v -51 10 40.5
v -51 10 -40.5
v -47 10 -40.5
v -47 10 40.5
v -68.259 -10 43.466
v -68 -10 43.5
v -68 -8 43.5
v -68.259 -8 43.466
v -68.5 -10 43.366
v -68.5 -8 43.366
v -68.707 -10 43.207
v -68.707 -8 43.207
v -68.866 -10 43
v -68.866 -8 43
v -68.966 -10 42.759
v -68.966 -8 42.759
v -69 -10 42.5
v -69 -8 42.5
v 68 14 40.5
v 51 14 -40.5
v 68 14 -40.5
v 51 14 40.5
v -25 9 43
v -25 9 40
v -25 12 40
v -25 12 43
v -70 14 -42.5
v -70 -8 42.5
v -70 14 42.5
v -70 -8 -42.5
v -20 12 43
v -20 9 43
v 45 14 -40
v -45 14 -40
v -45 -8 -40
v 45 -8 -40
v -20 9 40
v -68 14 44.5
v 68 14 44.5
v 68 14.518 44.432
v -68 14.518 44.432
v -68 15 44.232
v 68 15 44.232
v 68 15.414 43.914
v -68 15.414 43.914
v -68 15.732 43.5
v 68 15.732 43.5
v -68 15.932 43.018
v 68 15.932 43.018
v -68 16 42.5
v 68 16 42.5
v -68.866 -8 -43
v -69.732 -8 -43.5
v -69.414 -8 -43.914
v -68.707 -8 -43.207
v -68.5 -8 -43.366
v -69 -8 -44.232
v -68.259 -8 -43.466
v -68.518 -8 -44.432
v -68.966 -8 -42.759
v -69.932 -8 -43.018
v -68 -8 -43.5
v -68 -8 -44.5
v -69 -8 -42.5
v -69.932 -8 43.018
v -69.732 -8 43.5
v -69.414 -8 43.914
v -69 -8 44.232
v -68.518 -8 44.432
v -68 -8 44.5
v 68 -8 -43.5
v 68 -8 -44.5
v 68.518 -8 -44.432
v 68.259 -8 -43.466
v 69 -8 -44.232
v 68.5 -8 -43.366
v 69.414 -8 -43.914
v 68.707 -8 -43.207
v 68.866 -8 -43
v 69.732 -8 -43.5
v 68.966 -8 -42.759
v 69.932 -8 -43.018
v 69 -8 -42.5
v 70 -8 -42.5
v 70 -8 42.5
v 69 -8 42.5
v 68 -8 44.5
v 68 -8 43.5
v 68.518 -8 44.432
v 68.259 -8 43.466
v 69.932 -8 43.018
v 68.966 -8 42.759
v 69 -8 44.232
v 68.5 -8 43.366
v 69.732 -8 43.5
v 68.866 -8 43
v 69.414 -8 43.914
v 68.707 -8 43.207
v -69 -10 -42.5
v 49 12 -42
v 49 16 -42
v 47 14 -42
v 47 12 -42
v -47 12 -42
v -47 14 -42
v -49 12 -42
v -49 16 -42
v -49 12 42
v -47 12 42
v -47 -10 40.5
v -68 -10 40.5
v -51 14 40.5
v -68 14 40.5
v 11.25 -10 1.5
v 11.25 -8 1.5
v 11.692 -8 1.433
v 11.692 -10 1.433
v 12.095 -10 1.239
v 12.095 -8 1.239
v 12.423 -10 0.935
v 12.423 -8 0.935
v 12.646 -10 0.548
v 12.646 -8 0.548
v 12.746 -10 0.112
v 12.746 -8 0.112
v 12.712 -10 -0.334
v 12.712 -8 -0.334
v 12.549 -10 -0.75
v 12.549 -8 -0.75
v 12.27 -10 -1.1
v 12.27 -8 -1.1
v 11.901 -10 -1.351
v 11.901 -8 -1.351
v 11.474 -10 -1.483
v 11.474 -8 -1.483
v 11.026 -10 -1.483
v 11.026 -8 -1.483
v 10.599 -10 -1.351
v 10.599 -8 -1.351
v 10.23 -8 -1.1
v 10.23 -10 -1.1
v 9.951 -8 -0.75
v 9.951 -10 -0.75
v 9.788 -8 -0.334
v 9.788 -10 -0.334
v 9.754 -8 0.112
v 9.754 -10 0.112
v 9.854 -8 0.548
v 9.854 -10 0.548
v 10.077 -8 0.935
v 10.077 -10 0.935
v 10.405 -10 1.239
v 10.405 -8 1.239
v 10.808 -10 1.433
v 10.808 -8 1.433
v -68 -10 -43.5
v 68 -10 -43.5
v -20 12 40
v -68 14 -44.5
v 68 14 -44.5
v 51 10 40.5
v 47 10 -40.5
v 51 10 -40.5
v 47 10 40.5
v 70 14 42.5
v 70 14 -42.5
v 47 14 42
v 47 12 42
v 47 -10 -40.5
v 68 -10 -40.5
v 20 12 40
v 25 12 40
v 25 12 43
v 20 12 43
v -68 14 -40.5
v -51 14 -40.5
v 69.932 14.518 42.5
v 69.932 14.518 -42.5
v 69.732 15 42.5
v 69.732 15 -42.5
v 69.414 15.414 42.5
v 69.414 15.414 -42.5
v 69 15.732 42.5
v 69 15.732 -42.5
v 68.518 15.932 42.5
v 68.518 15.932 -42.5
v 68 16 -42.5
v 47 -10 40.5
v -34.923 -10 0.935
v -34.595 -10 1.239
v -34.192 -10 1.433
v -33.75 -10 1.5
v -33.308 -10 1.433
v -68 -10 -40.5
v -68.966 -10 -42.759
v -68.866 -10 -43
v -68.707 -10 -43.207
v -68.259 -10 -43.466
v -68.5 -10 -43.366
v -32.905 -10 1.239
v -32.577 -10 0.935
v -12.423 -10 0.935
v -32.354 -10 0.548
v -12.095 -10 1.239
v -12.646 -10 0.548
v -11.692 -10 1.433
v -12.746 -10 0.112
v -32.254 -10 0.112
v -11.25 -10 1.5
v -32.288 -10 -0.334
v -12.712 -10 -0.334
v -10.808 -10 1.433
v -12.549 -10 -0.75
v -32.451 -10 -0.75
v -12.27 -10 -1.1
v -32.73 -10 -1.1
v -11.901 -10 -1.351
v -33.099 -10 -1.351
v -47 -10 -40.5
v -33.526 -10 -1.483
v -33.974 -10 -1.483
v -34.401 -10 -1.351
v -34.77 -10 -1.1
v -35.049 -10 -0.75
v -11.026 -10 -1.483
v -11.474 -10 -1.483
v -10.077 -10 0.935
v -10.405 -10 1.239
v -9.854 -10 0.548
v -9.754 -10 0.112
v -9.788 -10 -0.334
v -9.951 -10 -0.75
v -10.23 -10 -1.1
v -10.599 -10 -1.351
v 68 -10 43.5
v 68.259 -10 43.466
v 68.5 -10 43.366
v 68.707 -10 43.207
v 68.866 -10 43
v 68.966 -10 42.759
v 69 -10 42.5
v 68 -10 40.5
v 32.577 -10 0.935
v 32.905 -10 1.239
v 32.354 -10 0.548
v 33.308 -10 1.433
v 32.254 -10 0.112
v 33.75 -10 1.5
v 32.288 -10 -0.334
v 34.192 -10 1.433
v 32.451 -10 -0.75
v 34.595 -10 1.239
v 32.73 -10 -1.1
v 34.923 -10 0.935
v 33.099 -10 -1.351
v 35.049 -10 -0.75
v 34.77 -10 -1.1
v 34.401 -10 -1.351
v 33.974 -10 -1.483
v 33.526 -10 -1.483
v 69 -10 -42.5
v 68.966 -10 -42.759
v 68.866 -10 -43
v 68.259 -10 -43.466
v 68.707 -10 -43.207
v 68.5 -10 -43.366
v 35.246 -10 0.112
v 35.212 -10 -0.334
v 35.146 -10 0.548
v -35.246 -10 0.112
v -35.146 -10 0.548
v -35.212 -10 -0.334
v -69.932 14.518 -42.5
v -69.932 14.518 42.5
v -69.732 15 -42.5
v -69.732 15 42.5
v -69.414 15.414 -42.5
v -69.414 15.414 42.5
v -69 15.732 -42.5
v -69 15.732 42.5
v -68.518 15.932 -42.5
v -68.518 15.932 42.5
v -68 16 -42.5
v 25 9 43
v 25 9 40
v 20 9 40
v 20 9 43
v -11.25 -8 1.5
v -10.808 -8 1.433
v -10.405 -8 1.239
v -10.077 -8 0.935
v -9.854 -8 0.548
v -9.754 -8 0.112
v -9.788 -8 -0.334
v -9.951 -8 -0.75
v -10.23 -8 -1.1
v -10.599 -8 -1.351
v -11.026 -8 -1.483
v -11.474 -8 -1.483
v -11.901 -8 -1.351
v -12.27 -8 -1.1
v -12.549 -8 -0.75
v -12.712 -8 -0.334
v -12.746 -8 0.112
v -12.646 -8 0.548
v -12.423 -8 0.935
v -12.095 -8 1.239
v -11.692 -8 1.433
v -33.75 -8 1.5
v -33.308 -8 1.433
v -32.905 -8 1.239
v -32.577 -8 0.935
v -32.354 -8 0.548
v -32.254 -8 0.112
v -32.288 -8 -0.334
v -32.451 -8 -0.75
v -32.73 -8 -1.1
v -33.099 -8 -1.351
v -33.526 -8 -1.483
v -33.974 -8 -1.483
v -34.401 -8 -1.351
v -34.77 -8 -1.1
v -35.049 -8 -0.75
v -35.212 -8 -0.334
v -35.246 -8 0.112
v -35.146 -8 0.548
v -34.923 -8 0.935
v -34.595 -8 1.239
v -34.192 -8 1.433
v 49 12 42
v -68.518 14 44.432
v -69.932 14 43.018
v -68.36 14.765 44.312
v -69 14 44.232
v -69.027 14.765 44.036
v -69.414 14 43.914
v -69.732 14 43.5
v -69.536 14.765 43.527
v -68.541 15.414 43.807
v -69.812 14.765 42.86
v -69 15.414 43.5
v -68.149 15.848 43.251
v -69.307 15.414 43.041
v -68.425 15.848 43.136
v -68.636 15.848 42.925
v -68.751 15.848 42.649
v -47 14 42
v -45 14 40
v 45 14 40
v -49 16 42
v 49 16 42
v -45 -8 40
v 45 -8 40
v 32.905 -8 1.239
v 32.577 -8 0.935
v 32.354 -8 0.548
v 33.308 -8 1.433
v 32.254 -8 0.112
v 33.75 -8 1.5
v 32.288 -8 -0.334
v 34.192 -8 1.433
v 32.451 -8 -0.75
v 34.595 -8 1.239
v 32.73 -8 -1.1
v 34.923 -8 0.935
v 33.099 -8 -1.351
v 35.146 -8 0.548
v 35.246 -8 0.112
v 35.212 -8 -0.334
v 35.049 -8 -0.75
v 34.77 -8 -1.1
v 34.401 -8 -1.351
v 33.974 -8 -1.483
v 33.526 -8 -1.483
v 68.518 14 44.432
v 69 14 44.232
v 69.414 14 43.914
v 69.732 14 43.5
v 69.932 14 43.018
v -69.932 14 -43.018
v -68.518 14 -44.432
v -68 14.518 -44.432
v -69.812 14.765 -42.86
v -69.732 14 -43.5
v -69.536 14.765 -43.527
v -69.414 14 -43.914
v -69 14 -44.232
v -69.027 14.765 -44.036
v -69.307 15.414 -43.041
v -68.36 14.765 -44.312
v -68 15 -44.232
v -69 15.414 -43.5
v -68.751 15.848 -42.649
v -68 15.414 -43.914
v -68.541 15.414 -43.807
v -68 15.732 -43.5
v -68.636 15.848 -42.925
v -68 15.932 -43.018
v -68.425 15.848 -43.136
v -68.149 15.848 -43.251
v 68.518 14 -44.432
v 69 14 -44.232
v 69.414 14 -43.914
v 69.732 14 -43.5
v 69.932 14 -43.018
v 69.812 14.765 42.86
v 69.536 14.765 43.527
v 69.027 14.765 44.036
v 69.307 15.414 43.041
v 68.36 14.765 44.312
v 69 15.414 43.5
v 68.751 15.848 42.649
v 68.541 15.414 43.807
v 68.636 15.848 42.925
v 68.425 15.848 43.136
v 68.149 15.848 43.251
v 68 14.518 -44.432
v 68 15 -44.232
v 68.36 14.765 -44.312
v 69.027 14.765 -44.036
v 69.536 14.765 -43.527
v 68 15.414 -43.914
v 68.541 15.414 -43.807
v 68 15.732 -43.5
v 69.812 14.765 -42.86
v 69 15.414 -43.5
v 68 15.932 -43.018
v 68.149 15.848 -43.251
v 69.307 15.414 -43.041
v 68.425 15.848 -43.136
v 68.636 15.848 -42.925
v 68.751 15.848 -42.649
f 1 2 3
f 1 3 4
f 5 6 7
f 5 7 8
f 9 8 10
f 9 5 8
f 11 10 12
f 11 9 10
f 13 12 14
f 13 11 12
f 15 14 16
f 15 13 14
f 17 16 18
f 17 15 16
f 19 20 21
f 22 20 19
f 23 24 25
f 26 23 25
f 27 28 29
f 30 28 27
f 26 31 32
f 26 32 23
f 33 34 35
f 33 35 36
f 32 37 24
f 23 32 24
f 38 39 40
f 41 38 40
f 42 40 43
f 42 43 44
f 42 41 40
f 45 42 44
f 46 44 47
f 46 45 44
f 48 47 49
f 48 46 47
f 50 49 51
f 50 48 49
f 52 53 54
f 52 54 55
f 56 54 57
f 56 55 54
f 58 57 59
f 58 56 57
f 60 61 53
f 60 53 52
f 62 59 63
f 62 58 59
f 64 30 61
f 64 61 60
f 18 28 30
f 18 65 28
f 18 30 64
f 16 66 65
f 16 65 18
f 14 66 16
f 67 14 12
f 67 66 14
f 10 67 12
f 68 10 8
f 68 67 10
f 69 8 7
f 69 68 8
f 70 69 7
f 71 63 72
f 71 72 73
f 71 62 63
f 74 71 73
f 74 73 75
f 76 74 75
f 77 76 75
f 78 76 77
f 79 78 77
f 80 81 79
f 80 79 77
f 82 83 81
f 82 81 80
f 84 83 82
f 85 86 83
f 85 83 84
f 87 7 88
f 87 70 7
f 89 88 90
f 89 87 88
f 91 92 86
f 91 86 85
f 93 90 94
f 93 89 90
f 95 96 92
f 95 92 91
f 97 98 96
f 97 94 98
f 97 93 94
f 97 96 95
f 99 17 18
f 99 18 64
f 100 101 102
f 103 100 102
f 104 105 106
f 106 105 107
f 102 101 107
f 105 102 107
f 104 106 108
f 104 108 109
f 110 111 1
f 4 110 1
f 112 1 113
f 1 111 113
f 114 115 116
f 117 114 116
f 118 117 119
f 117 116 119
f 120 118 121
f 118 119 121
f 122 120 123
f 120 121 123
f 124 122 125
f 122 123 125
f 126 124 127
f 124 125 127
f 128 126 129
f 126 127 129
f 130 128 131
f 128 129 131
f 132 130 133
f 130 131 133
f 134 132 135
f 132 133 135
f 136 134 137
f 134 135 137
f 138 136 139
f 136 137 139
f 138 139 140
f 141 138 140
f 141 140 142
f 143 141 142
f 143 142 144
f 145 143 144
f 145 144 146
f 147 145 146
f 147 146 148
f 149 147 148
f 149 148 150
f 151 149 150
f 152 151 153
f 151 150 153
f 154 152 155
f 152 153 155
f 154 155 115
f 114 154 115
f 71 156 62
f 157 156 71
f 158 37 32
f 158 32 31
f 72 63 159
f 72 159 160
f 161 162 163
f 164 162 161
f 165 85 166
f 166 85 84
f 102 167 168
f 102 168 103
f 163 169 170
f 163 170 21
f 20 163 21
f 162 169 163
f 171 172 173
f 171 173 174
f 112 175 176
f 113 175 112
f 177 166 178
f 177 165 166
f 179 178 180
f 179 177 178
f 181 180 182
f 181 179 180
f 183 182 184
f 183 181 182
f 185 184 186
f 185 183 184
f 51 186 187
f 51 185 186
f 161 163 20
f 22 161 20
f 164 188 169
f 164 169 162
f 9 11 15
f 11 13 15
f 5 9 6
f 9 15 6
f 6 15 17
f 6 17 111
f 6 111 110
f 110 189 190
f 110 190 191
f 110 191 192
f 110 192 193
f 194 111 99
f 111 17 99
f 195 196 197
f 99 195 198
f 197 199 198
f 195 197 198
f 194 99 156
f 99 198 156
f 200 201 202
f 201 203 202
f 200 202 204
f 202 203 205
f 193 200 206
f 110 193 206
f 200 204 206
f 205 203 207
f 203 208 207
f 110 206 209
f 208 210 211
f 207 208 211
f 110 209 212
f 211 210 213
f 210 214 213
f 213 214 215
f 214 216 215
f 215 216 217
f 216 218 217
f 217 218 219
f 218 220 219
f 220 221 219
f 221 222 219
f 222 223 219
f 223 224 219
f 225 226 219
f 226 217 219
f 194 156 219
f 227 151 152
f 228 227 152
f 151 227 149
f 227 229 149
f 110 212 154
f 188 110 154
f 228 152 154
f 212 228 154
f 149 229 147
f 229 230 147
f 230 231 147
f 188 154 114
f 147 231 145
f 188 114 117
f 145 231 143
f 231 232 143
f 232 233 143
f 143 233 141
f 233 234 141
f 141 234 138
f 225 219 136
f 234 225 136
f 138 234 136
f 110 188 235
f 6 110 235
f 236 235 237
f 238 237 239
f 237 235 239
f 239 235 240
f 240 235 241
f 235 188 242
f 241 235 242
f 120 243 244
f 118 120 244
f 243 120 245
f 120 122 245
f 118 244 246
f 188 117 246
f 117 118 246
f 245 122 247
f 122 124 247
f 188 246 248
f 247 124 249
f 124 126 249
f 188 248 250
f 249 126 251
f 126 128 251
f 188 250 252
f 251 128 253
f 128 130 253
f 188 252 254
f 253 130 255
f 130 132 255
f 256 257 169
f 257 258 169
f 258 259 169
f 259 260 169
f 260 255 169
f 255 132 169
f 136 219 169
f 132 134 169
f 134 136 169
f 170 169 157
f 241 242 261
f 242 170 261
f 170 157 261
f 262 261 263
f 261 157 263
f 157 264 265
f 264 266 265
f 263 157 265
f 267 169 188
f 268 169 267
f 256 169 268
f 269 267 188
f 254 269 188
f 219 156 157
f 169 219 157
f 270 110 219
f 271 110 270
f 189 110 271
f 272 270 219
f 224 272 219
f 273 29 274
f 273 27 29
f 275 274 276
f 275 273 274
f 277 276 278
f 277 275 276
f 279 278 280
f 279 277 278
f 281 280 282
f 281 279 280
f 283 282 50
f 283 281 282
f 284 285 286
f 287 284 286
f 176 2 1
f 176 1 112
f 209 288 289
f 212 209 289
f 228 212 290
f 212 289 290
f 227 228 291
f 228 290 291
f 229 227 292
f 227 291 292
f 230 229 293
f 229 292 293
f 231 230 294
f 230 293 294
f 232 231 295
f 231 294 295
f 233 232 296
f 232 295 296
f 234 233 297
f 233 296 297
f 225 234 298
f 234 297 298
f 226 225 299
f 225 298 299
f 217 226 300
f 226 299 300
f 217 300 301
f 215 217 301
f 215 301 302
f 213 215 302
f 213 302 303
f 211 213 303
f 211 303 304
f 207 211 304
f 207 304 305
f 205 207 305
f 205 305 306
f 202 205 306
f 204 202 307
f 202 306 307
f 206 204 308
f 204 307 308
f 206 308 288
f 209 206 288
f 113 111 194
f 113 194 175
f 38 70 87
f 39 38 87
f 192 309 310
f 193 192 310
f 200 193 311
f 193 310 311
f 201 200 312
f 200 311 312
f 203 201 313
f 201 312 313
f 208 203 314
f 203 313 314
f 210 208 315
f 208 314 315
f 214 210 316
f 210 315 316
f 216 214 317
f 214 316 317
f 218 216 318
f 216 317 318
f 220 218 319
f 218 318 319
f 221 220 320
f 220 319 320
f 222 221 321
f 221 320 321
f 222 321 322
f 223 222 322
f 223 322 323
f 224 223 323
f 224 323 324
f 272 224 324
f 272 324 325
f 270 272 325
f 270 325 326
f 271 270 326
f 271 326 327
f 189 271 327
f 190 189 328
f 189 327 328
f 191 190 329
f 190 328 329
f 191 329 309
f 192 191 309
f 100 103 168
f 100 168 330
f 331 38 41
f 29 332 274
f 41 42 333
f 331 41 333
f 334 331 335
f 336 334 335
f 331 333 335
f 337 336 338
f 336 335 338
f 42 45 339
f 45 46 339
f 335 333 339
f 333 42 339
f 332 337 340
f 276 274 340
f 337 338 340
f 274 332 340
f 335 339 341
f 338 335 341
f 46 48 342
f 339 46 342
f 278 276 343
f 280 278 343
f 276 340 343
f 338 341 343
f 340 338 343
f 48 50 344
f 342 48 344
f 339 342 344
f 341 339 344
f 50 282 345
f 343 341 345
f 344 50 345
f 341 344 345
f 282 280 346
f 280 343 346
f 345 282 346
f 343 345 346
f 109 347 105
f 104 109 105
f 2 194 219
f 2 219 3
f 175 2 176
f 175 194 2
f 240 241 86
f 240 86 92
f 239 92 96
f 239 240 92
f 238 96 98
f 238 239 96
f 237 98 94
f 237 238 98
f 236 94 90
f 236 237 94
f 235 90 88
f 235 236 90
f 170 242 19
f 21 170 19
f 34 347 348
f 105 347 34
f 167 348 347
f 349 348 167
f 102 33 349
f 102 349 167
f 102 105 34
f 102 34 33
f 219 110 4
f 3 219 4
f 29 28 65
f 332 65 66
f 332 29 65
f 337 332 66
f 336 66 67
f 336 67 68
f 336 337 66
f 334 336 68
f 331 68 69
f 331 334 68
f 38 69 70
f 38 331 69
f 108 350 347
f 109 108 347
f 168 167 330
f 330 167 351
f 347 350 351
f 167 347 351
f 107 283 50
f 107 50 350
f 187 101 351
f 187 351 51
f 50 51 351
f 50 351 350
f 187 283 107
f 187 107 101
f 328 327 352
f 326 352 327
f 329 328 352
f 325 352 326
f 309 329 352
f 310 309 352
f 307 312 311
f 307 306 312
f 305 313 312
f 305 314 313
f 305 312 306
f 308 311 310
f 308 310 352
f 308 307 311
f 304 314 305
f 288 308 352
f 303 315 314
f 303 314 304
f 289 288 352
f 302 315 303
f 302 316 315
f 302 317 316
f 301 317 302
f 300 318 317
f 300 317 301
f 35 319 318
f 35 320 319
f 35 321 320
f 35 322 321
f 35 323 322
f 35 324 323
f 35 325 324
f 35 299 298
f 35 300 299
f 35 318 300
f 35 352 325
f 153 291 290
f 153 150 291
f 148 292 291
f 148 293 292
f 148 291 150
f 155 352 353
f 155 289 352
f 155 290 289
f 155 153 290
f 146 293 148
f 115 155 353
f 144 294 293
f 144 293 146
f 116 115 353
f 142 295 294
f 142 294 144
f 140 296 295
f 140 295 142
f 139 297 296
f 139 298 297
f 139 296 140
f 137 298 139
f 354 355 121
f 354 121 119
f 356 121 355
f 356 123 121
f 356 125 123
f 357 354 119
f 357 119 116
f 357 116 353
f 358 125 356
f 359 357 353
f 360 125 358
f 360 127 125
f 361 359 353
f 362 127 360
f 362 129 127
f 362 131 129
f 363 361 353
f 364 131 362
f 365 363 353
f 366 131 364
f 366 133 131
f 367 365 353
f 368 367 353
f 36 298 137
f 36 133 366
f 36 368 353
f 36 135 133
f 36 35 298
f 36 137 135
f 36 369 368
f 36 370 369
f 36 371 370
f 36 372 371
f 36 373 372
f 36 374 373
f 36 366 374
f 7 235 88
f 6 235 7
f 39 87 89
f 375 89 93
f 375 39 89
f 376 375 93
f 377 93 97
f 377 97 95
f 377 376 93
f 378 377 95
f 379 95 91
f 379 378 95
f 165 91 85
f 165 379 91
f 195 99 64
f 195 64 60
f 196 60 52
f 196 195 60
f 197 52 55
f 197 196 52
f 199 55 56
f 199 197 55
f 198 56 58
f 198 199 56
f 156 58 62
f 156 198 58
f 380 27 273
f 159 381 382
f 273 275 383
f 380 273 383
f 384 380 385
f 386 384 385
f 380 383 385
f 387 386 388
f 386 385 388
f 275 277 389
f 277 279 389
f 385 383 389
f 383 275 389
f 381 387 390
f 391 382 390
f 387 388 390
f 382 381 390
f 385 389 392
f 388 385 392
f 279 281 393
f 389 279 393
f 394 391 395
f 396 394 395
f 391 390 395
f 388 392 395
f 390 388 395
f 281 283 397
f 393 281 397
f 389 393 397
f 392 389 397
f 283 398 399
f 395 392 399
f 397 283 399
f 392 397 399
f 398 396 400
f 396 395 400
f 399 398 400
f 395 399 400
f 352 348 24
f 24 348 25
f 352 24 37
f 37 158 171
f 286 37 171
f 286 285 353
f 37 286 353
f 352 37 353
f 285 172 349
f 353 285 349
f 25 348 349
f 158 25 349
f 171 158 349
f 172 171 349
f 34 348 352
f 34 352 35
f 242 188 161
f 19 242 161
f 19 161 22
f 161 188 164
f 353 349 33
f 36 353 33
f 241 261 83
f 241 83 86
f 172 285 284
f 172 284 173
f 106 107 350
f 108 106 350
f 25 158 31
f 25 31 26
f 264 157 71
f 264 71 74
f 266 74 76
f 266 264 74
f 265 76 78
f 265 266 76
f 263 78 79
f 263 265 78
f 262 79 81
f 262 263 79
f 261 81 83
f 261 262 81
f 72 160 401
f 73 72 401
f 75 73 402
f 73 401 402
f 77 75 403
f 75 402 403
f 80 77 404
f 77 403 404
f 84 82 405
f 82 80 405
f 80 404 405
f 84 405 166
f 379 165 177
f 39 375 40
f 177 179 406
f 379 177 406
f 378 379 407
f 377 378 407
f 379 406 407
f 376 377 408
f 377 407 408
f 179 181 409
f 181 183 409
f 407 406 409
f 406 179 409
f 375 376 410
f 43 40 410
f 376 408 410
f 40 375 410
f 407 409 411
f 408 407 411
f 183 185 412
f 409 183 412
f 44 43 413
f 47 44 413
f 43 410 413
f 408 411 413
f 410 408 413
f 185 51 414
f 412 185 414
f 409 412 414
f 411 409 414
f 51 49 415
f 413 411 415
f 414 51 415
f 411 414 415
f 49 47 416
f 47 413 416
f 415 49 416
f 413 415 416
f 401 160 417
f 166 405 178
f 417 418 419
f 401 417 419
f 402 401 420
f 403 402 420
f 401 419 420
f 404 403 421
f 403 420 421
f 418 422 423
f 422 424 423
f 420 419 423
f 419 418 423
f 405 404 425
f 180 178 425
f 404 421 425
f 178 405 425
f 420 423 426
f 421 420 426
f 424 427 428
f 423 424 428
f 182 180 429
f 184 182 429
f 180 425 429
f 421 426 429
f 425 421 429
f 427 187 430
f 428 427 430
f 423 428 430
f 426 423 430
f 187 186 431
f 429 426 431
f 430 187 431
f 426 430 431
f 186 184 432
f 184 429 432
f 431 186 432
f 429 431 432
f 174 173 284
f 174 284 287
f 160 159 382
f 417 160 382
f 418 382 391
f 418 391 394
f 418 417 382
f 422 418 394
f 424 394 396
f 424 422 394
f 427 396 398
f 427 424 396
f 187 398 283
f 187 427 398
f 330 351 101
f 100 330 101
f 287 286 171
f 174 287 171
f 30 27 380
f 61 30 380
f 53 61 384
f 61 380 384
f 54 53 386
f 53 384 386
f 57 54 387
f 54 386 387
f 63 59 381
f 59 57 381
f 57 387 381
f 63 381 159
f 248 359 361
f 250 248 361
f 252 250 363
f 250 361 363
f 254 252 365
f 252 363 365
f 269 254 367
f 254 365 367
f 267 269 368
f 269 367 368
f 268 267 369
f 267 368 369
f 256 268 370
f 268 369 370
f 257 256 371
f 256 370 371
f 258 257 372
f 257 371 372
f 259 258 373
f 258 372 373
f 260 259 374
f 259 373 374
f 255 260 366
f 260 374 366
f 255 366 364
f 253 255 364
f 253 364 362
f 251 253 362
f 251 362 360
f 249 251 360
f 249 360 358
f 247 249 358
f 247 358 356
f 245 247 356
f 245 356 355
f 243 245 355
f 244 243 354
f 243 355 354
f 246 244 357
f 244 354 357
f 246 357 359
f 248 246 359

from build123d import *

# Parameters (mm, degrees)
BOSS_EXTRUDE1_DEPTH      = 16
BOSS_EXTRUDE1_DEPTH_BACK = 10
SKETCH1_W                = 140
SKETCH1_H                = 89
SKETCH2_W                = 94
SKETCH2_H                = 84
BOSS_EXTRUDE2_DEPTH      = 22
SKETCH3_W                = 90
SKETCH3_H                = 80
CUT_EXTRUDE2_DEPTH       = 24
SKETCH5_R                = 1.5
CUT_EXTRUDE4_DEPTH       = 2
FILLET1_R                = 2
FILLET2_R                = 2
CUT_EXTRUDE8_DEPTH       = 2
SKETCH10_W               = 5
SKETCH10_H               = 3
CUT_EXTRUDE9_DEPTH       = 3
SKETCH11_W               = 2
SKETCH11_H               = 84
CUT_EXTRUDE10_DEPTH      = 2
SHELL1_START             = -68
SHELL1_OUTLINE_W         = 20
SHELL1_OUTLINE_H         = 81
SHELL1_DEPTH             = 21
SHELL1_START_2           = 47
SHELL1_2_OUTLINE_W       = 20
SHELL1_2_OUTLINE_H       = 81
SHELL1_2_DEPTH           = 21
SHELL1_3_OUTLINE_W       = 4
SHELL1_3_OUTLINE_H       = 81
SHELL1_3_DEPTH           = 17
SHELL1_START_3           = 51
SHELL1_4_OUTLINE_W       = 4
SHELL1_4_OUTLINE_H       = 81
SHELL1_4_DEPTH           = 17
SKETCH7_OUTSIDE_W        = 175.584
SKETCH7_OUTSIDE_H        = 124.584
CUT_EXTRUDE6_DEPTH       = 2


# Read off the part's stored shape, not the designer's step: Shell1
with BuildPart() as part:
    # Sketch1 → Boss-Extrude1 (new, two sides: drawn at the far end of the back side and taken through both)
    with BuildSketch(Plane(origin=(0, 0, 0), x_dir=(1, 0, 0), z_dir=(0, 1, 0)).offset(-BOSS_EXTRUDE1_DEPTH_BACK)):
        Rectangle(SKETCH1_W, SKETCH1_H)
    extrude(amount=BOSS_EXTRUDE1_DEPTH + BOSS_EXTRUDE1_DEPTH_BACK)

    # Sketch2 → Boss-Extrude2 (add)
    with BuildSketch(Plane(origin=(0, 16, 0), x_dir=(1, 0, 0), z_dir=(0, 1, 0))):
        Rectangle(SKETCH2_W, SKETCH2_H)
    extrude(amount=-BOSS_EXTRUDE2_DEPTH)

    # Sketch3 → Cut-Extrude2 (cut)
    with BuildSketch(Plane(origin=(0, 16, 0), x_dir=(1, 0, 0), z_dir=(0, 1, 0))):
        Rectangle(SKETCH3_W, SKETCH3_H)
    extrude(amount=-CUT_EXTRUDE2_DEPTH, mode=Mode.SUBTRACT)

    # Sketch5 → Cut-Extrude4 (cut)
    with BuildSketch(Plane(origin=(0, -8, 0), x_dir=(1, 0, 0), z_dir=(0, 1, 0))):
        with Locations(Location((-33.75, 0, 0), (0, 0, 270))):
            Circle(SKETCH5_R)
        with Locations(Location((-11.25, 0, 0), (0, 0, 270))):
            Circle(SKETCH5_R)
        with Locations(Location((11.25, 0, 0), (0, 0, 270))):
            Circle(SKETCH5_R)
        with Locations(Location((33.75, 0, 0), (0, 0, 270))):
            Circle(SKETCH5_R)
    extrude(amount=-CUT_EXTRUDE4_DEPTH, mode=Mode.SUBTRACT)

    # Fillet1
    fillet1_edges = [part.edges().sort_by_distance(p)[0] for p in [
        (70, 3, 44.5),
        (-70, 3, 44.5),
        (-70, 3, -44.5),
        (70, 3, -44.5),
    ]]
    fillet(fillet1_edges, radius=FILLET1_R)

    # Fillet2
    fillet2_edges = [part.edges().sort_by_distance(p)[0] for p in [
        (-70, 16, 0),
        (70, 16, 0),
        (0, 16, -44.5),
        (0, 16, 44.5),
        (69.414213562, 16, 43.914213562),
        (69.414213562, 16, -43.914213562),
        (-69.414213562, 16, -43.914213562),
        (-69.414213562, 16, 43.914213562),
    ]]
    fillet(fillet2_edges, radius=FILLET2_R)

    # Sketch8 → Cut-Extrude8 (cut)
    with BuildSketch(Plane(origin=(0, 16, 0), x_dir=(1, 0, 0), z_dir=(0, 1, 0))):
        Polygon((-47, 42), (-49, 42), (-49, -42), (-47, -42), (47, -42), (49, -42), (49, 42), (47, 42), align=None)
    extrude(amount=-CUT_EXTRUDE8_DEPTH, mode=Mode.SUBTRACT)

    # Sketch10 → Cut-Extrude9 (cut)
    with BuildSketch(Plane(origin=(0, 0, 40), x_dir=(-1, 0, 0), z_dir=(0, 0, -1))):
        with Locations((-22.5, 10.5)):
            Rectangle(SKETCH10_W, SKETCH10_H)
        with Locations((22.5, 10.5)):
            Rectangle(SKETCH10_W, SKETCH10_H)
    extrude(amount=-CUT_EXTRUDE9_DEPTH, mode=Mode.SUBTRACT)

    # Sketch11 → Cut-Extrude10 (cut)
    with BuildSketch(Plane(origin=(0, 14, 0), x_dir=(1, 0, 0), z_dir=(0, 1, 0))):
        with Locations((-48, 0)):
            Rectangle(SKETCH11_W, SKETCH11_H)
        with Locations((48, 0)):
            Rectangle(SKETCH11_W, SKETCH11_H)
    extrude(amount=-CUT_EXTRUDE10_DEPTH, mode=Mode.SUBTRACT)

    # Shell1 outline → Shell1 (cut)
    with BuildSketch(Plane.YZ.offset(SHELL1_START)):
        Rectangle(SHELL1_OUTLINE_W, SHELL1_OUTLINE_H)
    extrude(amount=SHELL1_DEPTH, mode=Mode.SUBTRACT)

    # Shell1 2 outline → Shell1 2 (cut)
    with BuildSketch(Plane.YZ.offset(SHELL1_START_2)):
        Rectangle(SHELL1_2_OUTLINE_W, SHELL1_2_OUTLINE_H)
    extrude(amount=SHELL1_2_DEPTH, mode=Mode.SUBTRACT)

    # Shell1 3 outline → Shell1 3 (cut)
    with BuildSketch(Plane.YZ.offset(SHELL1_START)):
        with Locations((12, 0)):
            Rectangle(SHELL1_3_OUTLINE_W, SHELL1_3_OUTLINE_H)
    extrude(amount=SHELL1_3_DEPTH, mode=Mode.SUBTRACT)

    # Shell1 4 outline → Shell1 4 (cut)
    with BuildSketch(Plane.YZ.offset(SHELL1_START_3)):
        with Locations((12, 0)):
            Rectangle(SHELL1_4_OUTLINE_W, SHELL1_4_OUTLINE_H)
    extrude(amount=SHELL1_4_DEPTH, mode=Mode.SUBTRACT)

    # Sketch7 outside → Cut-Extrude6 (cut)
    with BuildSketch(Plane.XZ.offset(10)):
        Rectangle(SKETCH7_OUTSIDE_W, SKETCH7_OUTSIDE_H)
        with BuildLine():
            Line((-68, -43.5), (68, -43.5))
            ThreePointArc((68, -43.5), (68.707106781, -43.207106781), (69, -42.5))
            Line((69, -42.5), (69, 42.5))
            ThreePointArc((69, 42.5), (68.707106781, 43.207106781), (68, 43.5))
            Line((68, 43.5), (-68, 43.5))
            ThreePointArc((-68, 43.5), (-68.707106781, 43.207106781), (-69, 42.5))
            Line((-69, 42.5), (-69, -42.5))
            ThreePointArc((-69, -42.5), (-68.707106781, -43.207106781), (-68, -43.5))
        make_face(mode=Mode.SUBTRACT)
    extrude(amount=-CUT_EXTRUDE6_DEPTH, mode=Mode.SUBTRACT)


solid = part.part
